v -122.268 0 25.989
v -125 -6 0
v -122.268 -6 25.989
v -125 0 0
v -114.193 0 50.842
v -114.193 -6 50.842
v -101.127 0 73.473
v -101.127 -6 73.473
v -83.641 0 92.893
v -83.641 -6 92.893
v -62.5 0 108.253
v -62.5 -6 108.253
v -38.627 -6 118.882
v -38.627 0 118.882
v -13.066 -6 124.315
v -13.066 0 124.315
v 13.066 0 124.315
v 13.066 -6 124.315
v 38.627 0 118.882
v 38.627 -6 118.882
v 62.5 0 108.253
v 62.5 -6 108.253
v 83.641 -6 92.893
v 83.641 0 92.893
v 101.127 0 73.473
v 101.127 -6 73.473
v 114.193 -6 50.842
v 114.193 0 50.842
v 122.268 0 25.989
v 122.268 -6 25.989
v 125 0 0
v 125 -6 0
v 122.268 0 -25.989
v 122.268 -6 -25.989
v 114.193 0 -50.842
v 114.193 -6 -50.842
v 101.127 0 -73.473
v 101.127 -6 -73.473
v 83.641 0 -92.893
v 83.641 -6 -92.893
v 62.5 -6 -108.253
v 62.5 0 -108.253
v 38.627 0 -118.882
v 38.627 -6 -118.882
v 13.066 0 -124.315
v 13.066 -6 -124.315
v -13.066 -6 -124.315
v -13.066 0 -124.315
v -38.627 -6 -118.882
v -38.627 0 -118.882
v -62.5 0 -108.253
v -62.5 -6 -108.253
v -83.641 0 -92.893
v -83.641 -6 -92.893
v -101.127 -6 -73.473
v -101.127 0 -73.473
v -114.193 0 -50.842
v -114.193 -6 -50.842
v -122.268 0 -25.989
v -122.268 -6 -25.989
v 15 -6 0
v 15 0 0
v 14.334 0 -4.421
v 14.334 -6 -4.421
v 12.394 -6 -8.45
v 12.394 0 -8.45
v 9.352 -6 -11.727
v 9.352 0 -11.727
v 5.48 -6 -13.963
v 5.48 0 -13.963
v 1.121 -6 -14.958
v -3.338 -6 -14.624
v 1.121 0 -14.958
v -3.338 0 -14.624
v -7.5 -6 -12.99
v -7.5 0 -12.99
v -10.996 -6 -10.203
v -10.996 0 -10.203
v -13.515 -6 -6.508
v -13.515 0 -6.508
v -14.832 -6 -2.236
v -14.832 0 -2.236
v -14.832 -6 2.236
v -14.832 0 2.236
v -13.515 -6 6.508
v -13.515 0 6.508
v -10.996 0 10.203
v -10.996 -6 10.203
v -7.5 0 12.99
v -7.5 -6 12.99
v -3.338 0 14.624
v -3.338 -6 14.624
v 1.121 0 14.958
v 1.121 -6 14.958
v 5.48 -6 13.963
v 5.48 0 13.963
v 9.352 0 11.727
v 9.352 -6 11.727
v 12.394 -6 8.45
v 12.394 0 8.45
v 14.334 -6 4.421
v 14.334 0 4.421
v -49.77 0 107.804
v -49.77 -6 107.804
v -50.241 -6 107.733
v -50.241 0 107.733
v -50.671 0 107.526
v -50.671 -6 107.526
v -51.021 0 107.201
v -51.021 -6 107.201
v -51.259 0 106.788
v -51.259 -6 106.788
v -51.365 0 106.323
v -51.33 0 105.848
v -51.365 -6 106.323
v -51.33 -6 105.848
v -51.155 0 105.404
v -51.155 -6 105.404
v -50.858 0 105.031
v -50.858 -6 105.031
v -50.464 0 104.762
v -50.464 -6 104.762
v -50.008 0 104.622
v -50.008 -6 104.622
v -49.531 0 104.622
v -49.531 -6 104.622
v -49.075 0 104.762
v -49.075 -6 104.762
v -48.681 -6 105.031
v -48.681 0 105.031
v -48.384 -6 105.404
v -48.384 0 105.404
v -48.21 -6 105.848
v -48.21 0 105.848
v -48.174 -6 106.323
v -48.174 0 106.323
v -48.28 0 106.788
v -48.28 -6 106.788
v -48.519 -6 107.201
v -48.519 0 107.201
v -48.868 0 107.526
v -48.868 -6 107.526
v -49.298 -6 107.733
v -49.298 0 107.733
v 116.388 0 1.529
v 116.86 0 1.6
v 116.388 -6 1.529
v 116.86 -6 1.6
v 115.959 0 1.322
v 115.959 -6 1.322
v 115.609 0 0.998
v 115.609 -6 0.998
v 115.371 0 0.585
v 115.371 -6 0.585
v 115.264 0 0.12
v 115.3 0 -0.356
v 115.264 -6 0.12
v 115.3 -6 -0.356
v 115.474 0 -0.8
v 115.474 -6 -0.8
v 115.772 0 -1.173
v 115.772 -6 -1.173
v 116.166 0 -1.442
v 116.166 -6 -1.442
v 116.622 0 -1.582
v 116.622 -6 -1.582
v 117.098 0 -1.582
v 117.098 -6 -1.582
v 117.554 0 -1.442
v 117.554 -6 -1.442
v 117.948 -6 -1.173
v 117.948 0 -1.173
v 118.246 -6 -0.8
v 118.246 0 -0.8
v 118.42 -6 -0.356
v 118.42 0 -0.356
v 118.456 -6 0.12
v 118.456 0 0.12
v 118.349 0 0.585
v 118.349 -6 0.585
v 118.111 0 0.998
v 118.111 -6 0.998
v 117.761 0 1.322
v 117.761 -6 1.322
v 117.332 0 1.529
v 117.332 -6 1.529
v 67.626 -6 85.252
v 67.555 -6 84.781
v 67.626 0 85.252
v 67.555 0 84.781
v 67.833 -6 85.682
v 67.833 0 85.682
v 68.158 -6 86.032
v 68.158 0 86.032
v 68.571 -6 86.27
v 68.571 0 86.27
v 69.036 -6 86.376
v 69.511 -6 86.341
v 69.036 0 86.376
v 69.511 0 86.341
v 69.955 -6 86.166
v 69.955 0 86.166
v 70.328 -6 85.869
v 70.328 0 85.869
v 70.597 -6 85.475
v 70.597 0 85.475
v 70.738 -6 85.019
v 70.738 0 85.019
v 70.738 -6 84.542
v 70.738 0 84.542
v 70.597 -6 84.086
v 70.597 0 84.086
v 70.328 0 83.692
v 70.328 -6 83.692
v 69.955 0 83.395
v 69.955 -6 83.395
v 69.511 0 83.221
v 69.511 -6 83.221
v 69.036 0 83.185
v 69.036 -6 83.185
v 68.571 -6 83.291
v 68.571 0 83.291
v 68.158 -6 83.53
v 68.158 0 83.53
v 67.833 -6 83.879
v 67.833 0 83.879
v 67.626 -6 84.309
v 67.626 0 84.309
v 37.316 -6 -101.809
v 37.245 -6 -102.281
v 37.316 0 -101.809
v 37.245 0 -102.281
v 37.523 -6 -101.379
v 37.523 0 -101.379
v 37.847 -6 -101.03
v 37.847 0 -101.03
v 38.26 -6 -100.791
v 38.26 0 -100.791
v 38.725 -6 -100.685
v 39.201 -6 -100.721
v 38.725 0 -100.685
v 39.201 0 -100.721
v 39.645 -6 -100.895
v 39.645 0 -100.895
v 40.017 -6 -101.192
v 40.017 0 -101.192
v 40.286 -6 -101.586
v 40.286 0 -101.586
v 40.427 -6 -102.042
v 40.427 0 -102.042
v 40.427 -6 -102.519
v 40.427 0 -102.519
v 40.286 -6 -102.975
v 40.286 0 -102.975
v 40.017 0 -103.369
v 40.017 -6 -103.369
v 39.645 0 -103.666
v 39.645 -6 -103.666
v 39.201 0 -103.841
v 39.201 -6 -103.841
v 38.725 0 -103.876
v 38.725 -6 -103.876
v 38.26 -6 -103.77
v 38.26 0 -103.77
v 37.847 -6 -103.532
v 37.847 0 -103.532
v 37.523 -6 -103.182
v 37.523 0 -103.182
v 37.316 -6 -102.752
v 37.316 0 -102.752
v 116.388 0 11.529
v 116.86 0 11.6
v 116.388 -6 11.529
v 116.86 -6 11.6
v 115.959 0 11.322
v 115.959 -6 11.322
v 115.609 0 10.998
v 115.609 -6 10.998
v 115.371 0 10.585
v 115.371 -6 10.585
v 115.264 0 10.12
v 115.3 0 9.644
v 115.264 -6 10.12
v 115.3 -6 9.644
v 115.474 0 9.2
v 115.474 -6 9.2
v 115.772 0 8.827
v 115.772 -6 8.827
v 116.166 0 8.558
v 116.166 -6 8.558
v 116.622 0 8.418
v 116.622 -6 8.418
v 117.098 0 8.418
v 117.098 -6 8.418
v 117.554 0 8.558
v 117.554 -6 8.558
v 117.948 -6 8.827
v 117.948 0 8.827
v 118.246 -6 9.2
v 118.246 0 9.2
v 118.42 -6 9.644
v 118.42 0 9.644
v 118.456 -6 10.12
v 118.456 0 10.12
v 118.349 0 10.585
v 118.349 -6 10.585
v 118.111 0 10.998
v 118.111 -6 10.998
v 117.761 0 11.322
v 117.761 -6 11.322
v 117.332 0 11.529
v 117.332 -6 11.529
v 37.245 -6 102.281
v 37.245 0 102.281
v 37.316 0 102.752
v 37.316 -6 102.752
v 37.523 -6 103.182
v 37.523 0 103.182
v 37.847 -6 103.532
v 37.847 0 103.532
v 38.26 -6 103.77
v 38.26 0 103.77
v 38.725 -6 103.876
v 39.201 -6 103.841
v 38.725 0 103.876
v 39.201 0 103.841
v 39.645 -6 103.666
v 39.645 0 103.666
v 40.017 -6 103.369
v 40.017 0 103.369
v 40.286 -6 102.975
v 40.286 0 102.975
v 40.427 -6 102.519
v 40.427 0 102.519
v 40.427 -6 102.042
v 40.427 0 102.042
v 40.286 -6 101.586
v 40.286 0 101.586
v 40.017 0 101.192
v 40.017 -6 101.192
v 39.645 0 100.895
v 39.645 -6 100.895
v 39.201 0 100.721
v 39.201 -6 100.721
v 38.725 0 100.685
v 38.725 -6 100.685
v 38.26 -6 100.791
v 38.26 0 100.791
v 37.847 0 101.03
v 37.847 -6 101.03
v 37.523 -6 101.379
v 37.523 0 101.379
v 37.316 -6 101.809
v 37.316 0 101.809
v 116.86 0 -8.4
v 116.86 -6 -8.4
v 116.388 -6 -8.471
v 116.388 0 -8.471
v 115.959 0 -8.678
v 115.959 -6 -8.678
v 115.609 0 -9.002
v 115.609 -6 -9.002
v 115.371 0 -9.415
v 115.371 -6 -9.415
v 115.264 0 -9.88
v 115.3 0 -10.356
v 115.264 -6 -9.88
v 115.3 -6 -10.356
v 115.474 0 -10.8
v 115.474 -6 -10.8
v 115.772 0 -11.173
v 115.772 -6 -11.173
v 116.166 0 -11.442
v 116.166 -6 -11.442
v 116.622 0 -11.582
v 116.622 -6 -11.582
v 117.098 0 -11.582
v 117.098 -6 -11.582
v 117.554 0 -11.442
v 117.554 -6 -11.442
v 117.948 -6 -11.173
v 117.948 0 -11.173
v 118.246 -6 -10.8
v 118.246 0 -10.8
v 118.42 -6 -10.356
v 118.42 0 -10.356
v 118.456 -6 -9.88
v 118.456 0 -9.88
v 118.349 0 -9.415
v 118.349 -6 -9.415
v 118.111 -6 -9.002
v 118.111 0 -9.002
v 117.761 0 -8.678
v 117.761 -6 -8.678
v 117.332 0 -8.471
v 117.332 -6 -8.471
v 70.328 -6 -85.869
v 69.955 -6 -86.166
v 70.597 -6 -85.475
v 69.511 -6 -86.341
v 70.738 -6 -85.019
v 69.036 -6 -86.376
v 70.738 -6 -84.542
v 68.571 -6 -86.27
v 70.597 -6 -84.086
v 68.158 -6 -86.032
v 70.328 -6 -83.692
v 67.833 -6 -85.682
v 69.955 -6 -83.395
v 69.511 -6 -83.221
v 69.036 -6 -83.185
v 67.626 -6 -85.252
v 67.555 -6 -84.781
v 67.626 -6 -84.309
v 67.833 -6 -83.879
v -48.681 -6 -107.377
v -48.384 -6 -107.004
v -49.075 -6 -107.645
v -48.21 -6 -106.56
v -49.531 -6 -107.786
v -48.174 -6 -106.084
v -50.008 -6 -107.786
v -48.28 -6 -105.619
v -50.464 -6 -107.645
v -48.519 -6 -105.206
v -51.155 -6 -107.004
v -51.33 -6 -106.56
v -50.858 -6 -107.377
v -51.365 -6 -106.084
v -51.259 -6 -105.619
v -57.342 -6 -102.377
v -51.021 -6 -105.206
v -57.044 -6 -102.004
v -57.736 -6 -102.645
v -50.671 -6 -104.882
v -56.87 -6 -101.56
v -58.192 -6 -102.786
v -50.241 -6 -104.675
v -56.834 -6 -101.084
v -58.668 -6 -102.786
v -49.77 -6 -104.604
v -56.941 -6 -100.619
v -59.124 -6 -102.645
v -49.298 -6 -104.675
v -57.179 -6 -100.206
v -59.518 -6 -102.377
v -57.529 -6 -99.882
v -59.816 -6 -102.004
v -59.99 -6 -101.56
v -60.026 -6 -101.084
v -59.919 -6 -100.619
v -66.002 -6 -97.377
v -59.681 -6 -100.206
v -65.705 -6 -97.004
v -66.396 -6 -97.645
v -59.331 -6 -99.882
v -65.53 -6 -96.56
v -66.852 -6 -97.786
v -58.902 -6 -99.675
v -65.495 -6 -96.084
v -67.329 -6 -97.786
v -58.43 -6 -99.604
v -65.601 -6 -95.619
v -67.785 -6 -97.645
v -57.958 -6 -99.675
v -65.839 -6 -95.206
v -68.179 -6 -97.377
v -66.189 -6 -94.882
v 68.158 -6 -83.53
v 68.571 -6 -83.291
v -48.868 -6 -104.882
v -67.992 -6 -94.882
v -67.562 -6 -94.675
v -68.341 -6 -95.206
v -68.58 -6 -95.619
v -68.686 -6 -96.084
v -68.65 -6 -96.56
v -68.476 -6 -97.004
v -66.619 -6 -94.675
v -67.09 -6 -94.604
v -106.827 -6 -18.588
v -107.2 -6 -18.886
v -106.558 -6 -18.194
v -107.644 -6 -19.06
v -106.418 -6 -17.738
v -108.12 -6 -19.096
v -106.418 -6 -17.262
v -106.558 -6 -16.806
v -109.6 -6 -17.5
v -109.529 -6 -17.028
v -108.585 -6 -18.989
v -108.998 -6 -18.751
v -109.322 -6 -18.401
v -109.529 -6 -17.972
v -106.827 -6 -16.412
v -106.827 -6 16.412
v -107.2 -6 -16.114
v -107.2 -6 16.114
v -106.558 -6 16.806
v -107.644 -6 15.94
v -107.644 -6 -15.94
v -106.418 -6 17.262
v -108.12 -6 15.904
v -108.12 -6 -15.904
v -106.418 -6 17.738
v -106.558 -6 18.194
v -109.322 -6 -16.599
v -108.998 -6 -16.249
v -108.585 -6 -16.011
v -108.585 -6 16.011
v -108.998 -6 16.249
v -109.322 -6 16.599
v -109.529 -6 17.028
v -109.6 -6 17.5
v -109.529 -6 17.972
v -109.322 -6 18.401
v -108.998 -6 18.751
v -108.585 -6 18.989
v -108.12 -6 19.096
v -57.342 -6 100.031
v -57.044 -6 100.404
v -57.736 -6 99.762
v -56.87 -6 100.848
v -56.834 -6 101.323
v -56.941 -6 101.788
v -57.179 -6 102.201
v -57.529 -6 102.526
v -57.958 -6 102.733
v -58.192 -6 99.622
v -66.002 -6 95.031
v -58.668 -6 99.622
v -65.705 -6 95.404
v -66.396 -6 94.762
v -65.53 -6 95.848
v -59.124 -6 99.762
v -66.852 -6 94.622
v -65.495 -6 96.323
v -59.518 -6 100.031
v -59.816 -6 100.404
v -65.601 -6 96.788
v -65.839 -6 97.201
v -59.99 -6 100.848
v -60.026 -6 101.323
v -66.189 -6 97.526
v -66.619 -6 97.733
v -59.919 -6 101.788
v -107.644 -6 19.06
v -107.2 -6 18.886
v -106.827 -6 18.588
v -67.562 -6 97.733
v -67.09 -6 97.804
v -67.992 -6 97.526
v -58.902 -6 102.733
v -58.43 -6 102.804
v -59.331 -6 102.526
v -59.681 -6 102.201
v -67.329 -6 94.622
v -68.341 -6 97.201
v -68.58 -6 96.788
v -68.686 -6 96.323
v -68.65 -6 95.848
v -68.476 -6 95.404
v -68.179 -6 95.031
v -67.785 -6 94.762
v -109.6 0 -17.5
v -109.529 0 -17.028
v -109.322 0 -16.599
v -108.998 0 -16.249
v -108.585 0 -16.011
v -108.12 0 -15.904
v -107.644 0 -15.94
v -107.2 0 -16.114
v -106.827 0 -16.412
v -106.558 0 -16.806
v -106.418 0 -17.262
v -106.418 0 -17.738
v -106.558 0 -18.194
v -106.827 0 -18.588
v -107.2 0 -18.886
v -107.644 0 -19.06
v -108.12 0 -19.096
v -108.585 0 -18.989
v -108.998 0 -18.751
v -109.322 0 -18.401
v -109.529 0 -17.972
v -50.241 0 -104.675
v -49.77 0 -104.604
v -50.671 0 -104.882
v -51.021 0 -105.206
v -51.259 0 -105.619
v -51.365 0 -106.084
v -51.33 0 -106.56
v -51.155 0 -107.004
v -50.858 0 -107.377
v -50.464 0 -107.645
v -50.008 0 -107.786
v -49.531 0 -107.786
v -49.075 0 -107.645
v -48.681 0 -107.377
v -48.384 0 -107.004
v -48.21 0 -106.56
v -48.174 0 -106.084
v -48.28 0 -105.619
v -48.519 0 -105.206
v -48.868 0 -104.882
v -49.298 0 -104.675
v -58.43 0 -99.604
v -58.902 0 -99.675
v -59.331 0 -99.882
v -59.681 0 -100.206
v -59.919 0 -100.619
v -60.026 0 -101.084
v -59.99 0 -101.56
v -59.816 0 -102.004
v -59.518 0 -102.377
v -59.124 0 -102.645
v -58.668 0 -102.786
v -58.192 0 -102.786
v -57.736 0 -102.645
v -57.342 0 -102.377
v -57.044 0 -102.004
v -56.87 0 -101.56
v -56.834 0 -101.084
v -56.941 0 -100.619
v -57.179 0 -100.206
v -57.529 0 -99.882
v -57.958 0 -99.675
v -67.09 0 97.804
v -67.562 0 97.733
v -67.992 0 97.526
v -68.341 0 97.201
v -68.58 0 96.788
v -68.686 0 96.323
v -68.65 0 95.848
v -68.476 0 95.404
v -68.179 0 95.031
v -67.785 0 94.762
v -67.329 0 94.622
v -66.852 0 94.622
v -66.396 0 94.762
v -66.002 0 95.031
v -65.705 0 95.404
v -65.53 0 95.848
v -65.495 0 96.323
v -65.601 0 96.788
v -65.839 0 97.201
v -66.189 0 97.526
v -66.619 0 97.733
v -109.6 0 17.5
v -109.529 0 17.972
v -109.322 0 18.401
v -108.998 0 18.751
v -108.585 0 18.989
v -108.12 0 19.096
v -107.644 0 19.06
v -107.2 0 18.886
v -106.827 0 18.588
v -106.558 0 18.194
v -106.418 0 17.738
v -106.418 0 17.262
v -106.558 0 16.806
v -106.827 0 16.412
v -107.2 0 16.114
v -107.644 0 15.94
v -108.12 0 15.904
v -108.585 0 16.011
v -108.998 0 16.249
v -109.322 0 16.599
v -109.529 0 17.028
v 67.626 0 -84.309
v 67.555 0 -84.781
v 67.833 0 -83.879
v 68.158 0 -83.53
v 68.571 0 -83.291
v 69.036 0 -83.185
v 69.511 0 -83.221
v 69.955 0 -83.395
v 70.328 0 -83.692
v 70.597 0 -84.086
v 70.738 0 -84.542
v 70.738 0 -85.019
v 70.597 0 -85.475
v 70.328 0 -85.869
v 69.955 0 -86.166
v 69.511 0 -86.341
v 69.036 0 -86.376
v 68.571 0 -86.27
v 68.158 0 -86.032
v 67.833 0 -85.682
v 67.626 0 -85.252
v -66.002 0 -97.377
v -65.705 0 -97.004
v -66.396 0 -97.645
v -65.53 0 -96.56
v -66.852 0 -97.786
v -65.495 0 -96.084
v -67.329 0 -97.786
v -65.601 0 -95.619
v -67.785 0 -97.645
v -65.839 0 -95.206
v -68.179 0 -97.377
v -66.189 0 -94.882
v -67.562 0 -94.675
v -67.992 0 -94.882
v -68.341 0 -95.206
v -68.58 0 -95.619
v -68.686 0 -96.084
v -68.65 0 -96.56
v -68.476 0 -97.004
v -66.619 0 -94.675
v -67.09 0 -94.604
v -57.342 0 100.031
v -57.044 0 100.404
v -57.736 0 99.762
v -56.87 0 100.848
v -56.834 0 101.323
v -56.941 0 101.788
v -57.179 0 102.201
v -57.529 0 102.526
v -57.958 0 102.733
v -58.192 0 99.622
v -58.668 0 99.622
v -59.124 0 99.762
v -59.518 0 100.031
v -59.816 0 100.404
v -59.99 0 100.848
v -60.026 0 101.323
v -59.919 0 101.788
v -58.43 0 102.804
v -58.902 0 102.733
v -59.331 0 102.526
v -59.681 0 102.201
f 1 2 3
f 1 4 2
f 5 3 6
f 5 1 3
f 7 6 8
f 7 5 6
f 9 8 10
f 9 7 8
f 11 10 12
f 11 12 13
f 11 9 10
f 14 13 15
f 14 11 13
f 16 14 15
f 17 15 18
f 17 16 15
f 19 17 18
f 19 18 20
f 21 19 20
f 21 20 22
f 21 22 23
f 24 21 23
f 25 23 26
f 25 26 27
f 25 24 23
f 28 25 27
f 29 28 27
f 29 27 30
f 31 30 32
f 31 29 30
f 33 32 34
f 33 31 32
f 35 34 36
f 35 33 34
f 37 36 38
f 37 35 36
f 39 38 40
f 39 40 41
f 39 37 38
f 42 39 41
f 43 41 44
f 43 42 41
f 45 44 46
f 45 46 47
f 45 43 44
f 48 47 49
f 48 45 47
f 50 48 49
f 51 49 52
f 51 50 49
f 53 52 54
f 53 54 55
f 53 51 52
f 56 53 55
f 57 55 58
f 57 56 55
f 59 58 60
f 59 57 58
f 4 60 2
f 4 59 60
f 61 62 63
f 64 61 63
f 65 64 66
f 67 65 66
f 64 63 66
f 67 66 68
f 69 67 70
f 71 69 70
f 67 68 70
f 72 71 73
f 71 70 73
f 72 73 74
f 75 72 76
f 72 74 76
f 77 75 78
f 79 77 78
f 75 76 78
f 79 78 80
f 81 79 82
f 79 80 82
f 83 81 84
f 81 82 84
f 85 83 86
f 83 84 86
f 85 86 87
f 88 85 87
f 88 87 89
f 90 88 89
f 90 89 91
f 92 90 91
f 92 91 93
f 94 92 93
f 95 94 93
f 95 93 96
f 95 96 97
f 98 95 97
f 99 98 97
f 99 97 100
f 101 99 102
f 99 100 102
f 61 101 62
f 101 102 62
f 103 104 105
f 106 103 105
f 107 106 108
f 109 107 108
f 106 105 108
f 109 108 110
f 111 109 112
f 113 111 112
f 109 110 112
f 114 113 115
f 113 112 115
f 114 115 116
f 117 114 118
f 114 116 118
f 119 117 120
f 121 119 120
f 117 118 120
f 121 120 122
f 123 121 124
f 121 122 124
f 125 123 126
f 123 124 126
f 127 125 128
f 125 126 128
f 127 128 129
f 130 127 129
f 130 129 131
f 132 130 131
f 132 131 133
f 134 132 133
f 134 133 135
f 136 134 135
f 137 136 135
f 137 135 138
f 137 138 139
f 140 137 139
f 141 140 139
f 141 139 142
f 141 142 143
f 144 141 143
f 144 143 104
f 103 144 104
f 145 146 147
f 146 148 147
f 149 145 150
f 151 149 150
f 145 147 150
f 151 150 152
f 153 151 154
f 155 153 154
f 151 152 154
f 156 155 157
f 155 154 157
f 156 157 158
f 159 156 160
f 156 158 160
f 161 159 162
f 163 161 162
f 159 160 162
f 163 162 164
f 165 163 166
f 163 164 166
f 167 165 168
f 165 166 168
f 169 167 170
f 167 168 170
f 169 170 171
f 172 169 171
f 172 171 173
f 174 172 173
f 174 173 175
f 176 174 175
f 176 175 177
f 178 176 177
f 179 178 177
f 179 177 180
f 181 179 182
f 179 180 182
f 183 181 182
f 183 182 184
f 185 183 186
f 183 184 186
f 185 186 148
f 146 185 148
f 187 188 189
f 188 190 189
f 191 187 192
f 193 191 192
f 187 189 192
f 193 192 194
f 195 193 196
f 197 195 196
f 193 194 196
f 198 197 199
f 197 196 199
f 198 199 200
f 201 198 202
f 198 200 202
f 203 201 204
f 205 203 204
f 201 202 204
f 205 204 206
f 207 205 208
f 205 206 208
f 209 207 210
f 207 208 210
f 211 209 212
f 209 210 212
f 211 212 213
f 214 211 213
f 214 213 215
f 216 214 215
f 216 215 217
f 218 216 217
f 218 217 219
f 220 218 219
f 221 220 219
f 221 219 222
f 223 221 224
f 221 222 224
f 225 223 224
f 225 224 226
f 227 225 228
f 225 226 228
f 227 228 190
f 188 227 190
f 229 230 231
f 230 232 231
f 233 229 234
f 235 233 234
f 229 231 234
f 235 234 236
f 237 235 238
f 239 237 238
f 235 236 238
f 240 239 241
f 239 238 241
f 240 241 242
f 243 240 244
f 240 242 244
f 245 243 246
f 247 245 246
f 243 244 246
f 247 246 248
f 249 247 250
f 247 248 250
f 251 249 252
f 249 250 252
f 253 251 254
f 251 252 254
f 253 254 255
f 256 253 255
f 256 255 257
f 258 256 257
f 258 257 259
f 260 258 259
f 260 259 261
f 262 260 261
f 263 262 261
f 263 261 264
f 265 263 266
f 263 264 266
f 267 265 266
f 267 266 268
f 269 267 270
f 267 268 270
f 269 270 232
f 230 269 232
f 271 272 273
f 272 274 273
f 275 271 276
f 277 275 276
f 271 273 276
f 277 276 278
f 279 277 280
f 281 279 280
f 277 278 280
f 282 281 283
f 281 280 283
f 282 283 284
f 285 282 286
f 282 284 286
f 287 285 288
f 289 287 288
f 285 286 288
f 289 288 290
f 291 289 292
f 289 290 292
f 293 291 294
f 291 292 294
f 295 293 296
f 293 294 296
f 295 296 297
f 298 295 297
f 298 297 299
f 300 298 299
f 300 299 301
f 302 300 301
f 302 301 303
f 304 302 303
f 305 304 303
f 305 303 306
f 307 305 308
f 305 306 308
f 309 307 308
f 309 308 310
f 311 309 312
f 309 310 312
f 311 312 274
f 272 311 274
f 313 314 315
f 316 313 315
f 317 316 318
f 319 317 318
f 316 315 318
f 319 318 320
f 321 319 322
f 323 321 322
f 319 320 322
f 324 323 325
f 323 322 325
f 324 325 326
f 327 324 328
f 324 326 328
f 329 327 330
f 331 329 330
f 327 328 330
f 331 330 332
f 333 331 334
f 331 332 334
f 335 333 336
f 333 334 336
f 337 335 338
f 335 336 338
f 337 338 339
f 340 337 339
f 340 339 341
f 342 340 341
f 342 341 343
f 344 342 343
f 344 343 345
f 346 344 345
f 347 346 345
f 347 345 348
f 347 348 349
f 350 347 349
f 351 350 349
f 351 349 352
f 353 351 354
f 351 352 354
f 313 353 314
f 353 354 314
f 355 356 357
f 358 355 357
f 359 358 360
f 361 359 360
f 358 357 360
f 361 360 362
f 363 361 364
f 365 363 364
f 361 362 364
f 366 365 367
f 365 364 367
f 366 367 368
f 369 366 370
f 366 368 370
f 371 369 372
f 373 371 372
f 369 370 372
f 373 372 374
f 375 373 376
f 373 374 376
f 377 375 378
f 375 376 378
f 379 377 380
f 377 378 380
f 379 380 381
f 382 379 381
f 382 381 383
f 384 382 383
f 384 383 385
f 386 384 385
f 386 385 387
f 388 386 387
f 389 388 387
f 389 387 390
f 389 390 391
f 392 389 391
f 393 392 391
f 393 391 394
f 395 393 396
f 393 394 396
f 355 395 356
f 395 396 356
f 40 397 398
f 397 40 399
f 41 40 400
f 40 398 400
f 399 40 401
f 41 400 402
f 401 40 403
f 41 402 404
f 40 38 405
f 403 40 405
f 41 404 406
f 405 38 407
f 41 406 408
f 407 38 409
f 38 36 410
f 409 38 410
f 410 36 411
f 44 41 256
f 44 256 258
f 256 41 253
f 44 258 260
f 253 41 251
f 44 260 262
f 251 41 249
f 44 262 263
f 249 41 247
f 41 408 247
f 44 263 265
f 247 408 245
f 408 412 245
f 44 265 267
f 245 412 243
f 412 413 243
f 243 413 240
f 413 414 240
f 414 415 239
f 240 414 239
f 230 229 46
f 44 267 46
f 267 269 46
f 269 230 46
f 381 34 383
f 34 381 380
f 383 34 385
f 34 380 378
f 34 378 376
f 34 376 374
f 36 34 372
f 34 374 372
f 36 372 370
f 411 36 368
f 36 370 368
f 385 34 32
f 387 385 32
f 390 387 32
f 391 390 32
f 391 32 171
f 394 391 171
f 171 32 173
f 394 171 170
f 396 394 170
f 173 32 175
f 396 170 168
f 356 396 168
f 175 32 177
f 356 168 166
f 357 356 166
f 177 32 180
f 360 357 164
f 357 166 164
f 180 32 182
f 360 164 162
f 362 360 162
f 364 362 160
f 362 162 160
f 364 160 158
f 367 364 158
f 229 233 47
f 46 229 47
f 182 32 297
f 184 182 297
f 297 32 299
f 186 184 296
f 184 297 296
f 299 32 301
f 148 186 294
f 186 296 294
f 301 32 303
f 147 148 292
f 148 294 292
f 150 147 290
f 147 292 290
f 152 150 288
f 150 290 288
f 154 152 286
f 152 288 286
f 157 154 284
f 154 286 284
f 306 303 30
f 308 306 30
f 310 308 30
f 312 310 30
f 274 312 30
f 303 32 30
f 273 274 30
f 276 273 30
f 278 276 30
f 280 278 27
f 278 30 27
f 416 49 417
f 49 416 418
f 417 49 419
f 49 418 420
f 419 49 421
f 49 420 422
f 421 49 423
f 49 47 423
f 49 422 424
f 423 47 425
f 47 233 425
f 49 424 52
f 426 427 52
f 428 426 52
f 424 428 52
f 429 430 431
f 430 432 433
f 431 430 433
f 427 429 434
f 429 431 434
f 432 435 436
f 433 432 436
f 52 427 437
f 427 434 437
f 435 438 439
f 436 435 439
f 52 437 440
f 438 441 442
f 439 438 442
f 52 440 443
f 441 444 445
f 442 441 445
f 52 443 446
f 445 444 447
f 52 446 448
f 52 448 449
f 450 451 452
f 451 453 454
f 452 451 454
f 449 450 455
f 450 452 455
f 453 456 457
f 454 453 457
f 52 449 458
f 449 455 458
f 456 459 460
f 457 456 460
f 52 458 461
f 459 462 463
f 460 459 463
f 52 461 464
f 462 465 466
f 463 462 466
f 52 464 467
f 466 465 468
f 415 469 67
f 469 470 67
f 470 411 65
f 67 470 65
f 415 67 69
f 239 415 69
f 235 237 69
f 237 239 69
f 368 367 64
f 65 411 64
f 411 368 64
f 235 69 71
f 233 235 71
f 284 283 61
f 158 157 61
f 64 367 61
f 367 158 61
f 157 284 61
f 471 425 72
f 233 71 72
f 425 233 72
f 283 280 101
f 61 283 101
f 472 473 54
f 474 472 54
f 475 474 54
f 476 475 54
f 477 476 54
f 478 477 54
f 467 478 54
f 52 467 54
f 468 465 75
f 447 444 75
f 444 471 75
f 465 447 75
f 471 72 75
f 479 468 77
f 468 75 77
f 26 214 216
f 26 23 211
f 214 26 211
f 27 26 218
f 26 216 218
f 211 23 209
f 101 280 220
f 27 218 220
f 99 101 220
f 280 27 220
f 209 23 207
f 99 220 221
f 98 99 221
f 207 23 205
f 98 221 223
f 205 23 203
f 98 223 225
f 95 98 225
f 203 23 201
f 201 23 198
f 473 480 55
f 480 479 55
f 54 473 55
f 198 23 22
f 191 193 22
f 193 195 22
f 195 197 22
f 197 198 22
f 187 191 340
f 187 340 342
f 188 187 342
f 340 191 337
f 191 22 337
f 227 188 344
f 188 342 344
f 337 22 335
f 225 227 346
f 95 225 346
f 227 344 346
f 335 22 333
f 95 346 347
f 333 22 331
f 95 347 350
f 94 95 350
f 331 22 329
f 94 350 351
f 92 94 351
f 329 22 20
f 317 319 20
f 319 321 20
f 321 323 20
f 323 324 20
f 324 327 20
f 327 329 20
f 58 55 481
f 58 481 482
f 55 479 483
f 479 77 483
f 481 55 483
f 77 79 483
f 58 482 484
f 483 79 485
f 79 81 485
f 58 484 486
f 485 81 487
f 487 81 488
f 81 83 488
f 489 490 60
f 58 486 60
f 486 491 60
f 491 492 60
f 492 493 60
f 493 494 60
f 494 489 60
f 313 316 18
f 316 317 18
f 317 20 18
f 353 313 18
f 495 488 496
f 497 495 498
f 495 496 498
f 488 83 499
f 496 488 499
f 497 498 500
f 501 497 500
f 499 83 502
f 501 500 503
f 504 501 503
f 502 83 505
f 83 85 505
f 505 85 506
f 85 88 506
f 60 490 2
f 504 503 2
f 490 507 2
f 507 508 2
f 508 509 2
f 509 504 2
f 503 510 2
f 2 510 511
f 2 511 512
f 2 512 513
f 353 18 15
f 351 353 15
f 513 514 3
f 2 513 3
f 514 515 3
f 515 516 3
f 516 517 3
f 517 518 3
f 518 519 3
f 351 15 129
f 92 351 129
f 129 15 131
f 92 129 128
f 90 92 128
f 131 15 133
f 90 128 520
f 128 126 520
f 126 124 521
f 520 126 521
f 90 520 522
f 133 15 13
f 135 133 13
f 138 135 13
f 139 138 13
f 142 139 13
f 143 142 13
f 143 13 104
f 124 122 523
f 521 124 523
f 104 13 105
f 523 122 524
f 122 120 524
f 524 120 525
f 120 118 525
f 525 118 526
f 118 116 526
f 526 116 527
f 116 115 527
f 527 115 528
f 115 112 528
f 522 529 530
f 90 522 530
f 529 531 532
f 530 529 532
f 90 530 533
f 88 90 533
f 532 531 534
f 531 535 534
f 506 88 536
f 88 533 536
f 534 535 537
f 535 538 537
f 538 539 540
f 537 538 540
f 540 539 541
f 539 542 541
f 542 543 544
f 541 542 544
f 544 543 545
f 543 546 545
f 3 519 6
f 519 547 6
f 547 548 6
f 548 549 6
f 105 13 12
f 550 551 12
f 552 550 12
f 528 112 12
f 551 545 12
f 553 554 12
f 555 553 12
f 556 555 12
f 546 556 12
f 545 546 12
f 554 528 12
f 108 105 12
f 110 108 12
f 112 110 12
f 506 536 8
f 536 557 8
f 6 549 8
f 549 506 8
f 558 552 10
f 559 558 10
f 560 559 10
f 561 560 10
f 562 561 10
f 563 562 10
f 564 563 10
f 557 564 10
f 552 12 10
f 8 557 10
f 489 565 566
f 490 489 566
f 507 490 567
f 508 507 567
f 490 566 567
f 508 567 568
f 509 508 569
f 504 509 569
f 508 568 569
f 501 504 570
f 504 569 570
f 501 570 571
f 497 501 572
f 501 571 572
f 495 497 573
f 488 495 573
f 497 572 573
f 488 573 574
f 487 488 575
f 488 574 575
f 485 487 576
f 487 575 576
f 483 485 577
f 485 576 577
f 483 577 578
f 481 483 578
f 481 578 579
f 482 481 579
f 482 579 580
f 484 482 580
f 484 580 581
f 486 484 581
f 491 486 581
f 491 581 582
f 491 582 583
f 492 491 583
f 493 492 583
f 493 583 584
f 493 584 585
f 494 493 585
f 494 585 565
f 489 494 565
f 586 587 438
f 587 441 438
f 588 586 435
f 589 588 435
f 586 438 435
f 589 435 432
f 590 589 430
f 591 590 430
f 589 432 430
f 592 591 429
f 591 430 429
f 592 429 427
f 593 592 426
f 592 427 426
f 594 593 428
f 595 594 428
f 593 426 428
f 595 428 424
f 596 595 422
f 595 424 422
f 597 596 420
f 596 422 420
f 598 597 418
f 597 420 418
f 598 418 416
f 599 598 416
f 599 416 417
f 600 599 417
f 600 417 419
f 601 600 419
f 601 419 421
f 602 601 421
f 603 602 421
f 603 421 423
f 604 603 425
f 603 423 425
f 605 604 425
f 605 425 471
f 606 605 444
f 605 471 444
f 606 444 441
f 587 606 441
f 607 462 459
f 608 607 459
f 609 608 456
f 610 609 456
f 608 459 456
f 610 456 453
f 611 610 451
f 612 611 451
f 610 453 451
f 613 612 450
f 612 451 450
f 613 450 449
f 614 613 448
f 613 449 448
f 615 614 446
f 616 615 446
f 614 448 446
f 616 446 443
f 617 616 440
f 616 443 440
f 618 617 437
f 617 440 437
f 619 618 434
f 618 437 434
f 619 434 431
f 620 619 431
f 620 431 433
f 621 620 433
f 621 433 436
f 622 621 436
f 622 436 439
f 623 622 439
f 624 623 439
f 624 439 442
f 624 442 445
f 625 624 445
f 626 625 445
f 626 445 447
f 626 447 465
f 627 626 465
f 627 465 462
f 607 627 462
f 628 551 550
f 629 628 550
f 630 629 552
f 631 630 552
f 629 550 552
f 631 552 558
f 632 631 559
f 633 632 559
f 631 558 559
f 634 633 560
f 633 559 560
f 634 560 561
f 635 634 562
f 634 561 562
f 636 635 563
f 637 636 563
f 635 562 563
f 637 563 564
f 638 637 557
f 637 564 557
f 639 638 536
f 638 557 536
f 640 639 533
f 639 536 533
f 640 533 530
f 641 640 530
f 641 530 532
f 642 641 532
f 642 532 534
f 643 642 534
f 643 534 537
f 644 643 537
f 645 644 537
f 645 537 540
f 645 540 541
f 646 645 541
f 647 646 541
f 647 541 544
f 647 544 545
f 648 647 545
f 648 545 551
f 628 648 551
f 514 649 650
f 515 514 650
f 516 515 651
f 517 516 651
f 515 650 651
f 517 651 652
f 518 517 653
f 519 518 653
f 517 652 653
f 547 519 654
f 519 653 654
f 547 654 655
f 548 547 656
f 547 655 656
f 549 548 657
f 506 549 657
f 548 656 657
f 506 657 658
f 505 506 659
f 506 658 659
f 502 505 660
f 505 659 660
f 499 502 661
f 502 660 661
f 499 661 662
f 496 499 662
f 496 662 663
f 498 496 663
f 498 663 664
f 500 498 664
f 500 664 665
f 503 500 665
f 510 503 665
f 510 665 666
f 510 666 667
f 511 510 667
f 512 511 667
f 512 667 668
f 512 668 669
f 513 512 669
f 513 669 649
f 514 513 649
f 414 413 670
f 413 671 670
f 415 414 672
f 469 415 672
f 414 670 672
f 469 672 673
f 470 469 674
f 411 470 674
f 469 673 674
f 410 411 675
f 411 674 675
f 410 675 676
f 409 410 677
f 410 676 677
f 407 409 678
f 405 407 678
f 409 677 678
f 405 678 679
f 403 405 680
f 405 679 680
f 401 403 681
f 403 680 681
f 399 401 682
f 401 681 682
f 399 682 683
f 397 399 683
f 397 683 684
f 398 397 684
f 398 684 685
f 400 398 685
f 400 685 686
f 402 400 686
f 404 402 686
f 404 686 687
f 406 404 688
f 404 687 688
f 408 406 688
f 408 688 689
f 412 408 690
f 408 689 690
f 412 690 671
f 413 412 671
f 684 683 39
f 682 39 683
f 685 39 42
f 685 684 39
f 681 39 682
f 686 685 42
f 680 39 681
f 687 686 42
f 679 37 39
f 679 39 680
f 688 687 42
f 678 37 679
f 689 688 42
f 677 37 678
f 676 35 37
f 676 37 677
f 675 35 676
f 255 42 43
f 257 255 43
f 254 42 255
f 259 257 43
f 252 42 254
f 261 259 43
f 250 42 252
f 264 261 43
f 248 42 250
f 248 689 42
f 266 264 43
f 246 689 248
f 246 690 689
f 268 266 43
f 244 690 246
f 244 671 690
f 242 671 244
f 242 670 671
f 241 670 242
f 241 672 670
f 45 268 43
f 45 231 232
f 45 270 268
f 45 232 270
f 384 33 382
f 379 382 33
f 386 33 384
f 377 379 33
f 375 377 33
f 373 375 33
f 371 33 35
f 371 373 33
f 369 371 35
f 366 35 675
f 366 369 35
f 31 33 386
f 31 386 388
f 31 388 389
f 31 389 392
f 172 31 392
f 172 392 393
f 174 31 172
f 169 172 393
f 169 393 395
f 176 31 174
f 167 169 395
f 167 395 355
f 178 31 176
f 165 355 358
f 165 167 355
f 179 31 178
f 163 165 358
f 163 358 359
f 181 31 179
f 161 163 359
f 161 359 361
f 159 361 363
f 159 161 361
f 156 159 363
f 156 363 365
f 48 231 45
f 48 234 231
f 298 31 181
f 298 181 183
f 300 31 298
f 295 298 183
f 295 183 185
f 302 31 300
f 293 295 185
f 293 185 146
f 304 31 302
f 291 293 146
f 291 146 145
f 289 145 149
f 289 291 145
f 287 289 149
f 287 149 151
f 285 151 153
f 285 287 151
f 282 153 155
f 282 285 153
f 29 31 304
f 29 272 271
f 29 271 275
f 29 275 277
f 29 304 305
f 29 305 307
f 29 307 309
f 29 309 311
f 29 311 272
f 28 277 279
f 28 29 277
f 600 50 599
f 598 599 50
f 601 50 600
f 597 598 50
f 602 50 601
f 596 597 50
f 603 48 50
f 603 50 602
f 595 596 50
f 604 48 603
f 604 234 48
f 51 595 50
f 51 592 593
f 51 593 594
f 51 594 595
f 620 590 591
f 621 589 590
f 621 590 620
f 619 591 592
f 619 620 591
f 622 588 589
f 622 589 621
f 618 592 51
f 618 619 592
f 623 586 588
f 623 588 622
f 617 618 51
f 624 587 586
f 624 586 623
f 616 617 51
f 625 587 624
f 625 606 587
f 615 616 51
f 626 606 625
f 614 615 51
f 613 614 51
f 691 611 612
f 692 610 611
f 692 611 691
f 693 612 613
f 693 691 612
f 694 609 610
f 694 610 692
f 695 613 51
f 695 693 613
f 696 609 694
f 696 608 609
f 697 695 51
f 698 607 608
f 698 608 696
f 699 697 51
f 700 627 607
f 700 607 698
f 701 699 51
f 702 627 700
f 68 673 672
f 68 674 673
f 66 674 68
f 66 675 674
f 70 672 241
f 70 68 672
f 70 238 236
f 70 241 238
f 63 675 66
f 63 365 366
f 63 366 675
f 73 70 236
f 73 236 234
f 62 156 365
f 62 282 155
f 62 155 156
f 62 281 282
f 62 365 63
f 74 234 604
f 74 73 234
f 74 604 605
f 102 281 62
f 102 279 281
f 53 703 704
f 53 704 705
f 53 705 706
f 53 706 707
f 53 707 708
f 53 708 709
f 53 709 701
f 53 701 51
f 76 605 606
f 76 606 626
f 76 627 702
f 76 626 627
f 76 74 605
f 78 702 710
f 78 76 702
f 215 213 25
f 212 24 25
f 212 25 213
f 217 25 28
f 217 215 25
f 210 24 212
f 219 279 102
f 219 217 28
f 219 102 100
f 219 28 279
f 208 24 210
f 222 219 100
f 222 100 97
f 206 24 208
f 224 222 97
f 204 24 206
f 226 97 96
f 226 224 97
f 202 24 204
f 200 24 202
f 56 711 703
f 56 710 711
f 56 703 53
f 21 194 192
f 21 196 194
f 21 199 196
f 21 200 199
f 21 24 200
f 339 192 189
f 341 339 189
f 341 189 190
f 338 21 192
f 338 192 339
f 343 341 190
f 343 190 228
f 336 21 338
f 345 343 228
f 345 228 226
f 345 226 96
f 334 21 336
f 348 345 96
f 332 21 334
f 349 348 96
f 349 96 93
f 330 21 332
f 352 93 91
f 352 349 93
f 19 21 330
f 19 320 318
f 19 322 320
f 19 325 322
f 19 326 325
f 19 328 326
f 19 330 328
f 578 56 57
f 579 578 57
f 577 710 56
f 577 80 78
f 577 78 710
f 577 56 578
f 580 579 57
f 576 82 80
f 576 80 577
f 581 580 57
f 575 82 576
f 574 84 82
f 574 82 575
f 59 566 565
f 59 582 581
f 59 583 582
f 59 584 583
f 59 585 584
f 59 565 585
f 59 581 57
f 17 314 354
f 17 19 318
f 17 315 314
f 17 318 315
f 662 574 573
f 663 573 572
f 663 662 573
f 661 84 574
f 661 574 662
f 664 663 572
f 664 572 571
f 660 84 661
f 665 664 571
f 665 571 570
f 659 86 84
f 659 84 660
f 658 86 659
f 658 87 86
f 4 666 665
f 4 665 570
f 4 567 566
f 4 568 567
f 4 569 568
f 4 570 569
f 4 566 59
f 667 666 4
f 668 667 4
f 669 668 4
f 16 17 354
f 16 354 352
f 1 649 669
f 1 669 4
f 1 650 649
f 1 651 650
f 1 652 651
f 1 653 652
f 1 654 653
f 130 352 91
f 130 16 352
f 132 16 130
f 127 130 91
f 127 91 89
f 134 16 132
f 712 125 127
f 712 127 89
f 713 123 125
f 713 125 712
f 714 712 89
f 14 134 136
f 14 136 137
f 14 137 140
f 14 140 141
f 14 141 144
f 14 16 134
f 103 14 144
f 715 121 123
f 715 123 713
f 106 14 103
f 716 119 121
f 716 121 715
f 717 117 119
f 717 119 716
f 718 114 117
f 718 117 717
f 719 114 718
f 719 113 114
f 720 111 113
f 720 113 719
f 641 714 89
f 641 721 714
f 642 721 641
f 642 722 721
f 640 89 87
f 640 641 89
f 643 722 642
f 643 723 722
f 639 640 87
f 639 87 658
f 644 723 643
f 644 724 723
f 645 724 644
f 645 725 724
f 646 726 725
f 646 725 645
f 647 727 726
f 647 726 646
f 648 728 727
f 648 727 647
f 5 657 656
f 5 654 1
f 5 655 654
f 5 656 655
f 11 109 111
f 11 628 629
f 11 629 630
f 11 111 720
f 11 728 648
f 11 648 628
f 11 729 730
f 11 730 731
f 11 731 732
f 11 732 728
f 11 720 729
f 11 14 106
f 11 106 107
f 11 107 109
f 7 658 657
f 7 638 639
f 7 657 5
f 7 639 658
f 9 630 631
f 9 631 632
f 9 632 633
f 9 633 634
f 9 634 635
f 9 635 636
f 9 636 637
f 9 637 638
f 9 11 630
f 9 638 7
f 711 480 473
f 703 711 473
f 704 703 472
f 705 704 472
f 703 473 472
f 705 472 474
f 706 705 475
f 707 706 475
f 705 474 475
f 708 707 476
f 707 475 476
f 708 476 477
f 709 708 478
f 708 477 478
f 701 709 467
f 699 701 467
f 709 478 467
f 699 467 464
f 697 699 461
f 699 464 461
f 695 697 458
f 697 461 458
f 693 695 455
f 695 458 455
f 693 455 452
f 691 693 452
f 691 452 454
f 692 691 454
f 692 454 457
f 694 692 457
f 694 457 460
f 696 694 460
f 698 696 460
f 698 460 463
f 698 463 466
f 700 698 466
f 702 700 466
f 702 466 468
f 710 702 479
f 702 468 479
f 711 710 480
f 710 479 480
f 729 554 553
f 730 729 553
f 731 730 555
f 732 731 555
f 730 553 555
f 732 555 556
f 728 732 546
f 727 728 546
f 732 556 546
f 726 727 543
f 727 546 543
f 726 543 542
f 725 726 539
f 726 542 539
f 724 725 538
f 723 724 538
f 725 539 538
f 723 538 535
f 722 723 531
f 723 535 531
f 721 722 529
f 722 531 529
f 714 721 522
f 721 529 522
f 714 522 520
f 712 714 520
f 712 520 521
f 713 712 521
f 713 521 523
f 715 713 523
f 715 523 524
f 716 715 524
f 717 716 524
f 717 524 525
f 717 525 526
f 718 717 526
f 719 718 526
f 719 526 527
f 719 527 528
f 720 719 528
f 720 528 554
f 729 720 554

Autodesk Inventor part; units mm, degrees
ref_plane "YZ Plane" through (0, 0, 0) normal (1, 0, 0) x (0, 1, 0)
ref_plane "XZ Plane" through (0, 0, 0) normal (0, 1, 0) x (-1, 0, 0)
ref_plane "XY Plane" through (0, 0, 0) normal (0, 0, 1) x (1, 0, 0)
sketch "スケッチ1" plane through (0, 0, 0) normal (0, 1, 0) x (-1, 0, 0)
  circle A0 centre (0, 0) radius 125
  dimension "d0" = 250
sketch "スケッチ2" plane through (0, 0, 0) normal (0, 1, 0) x (-1, 0, 0)
  circle A0 centre (108, 17.5) radius 1.6
  circle A1 centre (108, -17.5) radius 1.6
  circle A2 centre (-38.8446, 102.2807) radius 1.6
  circle A3 centre (-69.1554, 84.7807) radius 1.6
  circle A4 centre (-69.1554, -84.7807) radius 1.6
  circle A5 centre (-38.8446, -102.2807) radius 1.6
  point P0 (0, 0)
  dimension "d5" = 3.2
  dimension "d6" = 3.2
  dimension "d11" = 35
  dimension "d16" = 360
  dimension "d22" = 108
  dimension "d23" = 108
  dimension "d28" = 17.5
extrude "押し出し5" add sketch "スケッチ1" against normal blind 6
extrude "押し出し6" cut sketch "スケッチ2" against normal blind 6
sketch "スケッチ4" plane through (0, 0, 0) normal (0, 1, 0) x (1, 0, 0)
  circle A0 centre (0, 0) radius 116.86
  line L0 (0, 0) -> (-58.43, 101.2037)
  line L1 (0, 0) -> (116.86, 0) construction
  line L2 (0, 0) -> (-58.43, -101.2037)
  line L3 (0, 0) -> (116.86, 0) construction
  line L4 (0, 0) -> (116.86, 0)
  dimension "d33" = 233.72
  dimension "d34" = 120
  dimension "d35" = 120
hole "穴1" at (-58.43, 0, -101.2037) at (-58.43, 0, 101.2037) at (116.86, 0, 0) direction (0, -1, 0) diameter 3.2 depth 10
sketch "スケッチ5" plane through (0, 0, 0) normal (0, 1, 0) x (1, 0, 0)
  circle A0 centre (116.86, 0) radius 1.6 projected
  line L0 (116.86, 0) -> (116.86, 10)
  line L1 (116.86, 0) -> (126.86, 0) construction
  line L2 (116.86, 10) -> (116.86, -10)
  point P0 (0, 0)
  point P1 (-67.0903, 96.2037)
  point P2 (-49.7697, 106.2037)
  point P3 (-49.7697, -106.2037)
  point P4 (-67.0903, -96.2037)
  dimension "d43" = 10
  dimension "d44" = 90
  dimension "d45" = 20
  dimension "d48" = 360
hole "穴2" at (116.86, 0, -10) at (116.86, 0, 10) at (-67.0903, 0, -96.2037) at (-49.7697, 0, -106.2037) at (-49.7697, 0, 106.2037) at (-67.0903, 0, 96.2037) direction (0, -1, 0) diameter 3.2 depth 10
sketch "スケッチ6" plane through (0, 0, 0) normal (0, 1, 0) x (1, 0, 0)
  circle A0 centre (0, 0) radius 15
  dimension "d57" = 30
extrude "押し出し7" cut sketch "スケッチ6" against normal blind 10
properties part number "底板"
